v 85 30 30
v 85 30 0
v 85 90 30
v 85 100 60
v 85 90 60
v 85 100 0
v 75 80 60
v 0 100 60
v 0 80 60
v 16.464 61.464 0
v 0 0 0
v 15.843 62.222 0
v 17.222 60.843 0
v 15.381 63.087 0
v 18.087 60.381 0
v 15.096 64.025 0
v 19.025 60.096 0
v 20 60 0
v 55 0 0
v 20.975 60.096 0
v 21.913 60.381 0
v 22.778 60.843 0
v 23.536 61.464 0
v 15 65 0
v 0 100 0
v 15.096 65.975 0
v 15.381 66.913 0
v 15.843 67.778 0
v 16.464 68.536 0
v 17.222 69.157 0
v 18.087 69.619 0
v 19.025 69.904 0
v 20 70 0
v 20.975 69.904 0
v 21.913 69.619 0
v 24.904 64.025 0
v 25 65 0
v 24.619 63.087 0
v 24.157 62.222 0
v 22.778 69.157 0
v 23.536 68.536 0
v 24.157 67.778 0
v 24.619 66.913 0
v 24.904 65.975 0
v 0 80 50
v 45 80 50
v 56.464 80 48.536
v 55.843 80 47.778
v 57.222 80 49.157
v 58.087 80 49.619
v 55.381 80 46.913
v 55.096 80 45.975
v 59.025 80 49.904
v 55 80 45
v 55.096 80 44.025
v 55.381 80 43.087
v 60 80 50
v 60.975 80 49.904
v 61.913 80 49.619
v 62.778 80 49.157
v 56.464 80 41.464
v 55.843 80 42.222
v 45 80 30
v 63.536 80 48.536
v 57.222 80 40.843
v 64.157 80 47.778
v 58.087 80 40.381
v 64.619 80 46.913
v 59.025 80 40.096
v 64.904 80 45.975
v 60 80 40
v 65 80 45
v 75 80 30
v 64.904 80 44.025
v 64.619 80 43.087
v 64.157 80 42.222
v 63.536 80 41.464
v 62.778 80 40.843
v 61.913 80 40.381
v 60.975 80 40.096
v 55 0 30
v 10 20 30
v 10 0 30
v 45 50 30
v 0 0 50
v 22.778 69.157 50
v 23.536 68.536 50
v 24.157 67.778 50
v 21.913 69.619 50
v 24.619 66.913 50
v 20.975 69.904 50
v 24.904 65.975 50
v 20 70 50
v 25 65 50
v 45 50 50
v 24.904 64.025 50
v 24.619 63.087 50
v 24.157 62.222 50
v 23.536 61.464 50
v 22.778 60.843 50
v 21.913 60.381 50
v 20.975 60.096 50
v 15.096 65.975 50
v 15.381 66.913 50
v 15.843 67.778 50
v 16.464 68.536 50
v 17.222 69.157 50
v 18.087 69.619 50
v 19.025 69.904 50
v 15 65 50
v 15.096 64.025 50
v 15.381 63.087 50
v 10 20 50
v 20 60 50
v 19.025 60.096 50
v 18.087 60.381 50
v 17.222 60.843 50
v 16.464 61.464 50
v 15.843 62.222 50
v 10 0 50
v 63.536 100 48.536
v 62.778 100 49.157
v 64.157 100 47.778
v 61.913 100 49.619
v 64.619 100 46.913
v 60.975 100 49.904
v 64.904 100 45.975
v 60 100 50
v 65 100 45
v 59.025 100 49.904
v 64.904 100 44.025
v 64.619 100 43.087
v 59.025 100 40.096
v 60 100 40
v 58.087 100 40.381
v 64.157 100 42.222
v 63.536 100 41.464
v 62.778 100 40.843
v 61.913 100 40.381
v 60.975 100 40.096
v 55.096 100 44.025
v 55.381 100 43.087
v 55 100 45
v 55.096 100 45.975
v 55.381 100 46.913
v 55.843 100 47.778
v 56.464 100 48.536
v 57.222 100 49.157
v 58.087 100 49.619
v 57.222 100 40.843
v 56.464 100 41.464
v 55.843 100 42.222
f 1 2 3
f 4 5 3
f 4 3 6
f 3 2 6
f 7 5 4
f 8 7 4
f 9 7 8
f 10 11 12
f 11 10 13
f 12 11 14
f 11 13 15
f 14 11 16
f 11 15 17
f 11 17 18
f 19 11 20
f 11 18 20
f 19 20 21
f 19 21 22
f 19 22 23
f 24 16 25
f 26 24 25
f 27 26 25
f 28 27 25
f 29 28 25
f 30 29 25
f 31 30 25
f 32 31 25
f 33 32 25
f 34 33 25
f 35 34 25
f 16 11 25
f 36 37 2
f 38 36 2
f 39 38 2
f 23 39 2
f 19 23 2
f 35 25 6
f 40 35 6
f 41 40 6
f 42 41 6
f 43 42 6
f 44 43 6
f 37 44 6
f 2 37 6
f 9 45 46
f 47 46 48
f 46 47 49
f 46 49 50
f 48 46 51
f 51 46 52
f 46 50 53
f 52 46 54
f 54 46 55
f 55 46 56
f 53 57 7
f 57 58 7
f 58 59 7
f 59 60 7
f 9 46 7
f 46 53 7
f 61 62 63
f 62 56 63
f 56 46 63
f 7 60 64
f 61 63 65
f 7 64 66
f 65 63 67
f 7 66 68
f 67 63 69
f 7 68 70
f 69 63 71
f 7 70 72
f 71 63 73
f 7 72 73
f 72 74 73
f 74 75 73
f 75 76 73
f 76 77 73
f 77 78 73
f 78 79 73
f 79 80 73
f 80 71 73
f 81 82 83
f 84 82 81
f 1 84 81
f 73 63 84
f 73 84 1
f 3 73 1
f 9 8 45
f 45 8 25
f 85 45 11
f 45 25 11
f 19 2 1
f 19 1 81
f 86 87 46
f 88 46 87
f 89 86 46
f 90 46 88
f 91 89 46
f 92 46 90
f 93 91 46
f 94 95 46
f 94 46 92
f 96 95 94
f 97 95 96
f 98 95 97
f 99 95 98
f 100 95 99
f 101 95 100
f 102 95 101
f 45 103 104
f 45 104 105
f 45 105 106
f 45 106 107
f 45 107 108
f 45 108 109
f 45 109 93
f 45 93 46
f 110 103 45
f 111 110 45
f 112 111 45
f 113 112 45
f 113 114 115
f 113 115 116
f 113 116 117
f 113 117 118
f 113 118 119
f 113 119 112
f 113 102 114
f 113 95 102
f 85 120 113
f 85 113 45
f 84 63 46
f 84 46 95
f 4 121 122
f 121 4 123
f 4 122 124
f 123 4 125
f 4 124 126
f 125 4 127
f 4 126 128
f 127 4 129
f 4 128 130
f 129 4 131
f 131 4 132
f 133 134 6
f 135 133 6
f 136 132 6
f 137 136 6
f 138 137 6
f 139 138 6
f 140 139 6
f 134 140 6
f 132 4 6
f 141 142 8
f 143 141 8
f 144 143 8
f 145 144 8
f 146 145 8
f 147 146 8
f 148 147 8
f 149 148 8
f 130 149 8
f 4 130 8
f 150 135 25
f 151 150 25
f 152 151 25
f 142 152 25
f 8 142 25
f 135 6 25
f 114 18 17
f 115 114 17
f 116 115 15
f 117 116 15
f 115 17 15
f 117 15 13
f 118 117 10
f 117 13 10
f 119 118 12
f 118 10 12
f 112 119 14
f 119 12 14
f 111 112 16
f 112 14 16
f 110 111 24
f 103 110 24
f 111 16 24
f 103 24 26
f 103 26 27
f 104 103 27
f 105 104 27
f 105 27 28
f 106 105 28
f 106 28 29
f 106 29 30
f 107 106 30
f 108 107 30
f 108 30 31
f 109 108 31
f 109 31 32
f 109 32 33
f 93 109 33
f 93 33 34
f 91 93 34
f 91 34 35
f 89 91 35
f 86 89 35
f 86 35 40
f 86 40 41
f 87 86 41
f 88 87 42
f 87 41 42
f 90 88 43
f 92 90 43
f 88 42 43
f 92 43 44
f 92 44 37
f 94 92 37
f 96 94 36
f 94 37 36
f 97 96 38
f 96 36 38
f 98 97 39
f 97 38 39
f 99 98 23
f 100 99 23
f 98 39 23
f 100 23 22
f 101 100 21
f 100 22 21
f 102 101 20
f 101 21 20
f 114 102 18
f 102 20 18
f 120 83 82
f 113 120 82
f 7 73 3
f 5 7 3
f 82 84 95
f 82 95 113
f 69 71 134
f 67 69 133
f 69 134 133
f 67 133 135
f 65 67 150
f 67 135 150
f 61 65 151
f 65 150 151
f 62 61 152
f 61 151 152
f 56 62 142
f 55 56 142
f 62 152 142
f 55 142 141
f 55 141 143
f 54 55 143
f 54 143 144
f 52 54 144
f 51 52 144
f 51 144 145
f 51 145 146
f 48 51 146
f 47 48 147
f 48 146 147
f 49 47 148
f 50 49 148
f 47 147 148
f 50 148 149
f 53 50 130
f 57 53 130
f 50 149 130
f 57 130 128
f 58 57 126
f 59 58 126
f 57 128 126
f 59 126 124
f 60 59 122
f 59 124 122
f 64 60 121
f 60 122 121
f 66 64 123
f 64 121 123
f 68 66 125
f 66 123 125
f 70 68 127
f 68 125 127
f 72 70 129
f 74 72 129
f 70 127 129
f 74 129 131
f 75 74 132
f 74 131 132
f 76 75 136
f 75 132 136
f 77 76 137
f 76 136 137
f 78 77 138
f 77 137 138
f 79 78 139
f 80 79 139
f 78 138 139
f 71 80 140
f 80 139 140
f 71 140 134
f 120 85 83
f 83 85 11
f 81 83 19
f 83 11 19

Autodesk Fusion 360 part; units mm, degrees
sketch "Sketch1" plane through (0, 0, 0) normal (0, 0, 1) x (1, 0, 0)
  line L0 (0, 0) -> (55, 0)
  line L1 (0, 0) -> (0, 100)
  line L2 (0, 100) -> (85, 100)
  line L3 (85, 100) -> (85, 30)
  line L4 (85, 30) -> (55, 0)
  dimension "d1" = 55
  dimension "d2" = 100
  dimension "d3" = 85
  dimension "d4" = 70
extrude "Extrude1" add sketch "Sketch1" along normal blind 30
sketch "Sketch2" plane through (0, 0, 30) normal (0, 0, 1) x (-1, 0, 0)
  line L0 (0, 0) -> (-55, 0)
  line L1 (-55, 0) -> (-85, -30)
  line L2 (-85, -30) -> (-85, -100)
  line L3 (-85, -100) -> (0, -100)
  line L4 (0, -100) -> (0, 0)
  line L5 (0, 0) -> (-10, 0)
  line L6 (-10, 0) -> (-10, -20)
  line L7 (0, 0) -> (0, -100)
  line L8 (-85, -100) -> (-85, -90)
  line L9 (-85, -90) -> (-75, -80)
  line L10 (-75, -80) -> (-45, -80)
  line L11 (-45, -80) -> (-45, -50)
  line L12 (-45, -50) -> (-10, -20)
  dimension "d7" = 10
  dimension "d8" = 20
  dimension "d12" = 30
  dimension "d13" = 30
extrude "Extrude2" add sketch "Sketch2" along normal blind 20 contours L0 L2 L3 L4 L5 L6 L7 L8 L9 L10 L11 L12
sketch "Sketch3" plane through (0, 0, 50) normal (0, 0, 1) x (-1, 0, 0)
  line L0 (-85, -100) -> (0, -100)
  line L1 (0, -100) -> (0, 0)
  line L2 (0, 0) -> (-10, 0)
  line L3 (-10, 0) -> (-10, -20)
  line L4 (-10, -20) -> (-45, -50)
  line L5 (-45, -50) -> (-45, -80)
  line L6 (-45, -80) -> (-75, -80)
  line L7 (-75, -80) -> (-85, -90)
  line L8 (-85, -90) -> (-85, -100)
  line L9 (0, -100) -> (0, -80)
  line L10 (0, -80) -> (-75, -80)
  line L11 (-75, -80) -> (-85, -90)
  line L12 (-85, -90) -> (-85, -100)
  line L13 (-85, -100) -> (0, -100)
  dimension "d16" = 20
extrude "Extrude3" add sketch "Sketch3" along normal blind 10 contours L0 L1 L6 L7 L8 L9 L10 L11 L12 L13
sketch "Sketch4" plane through (0, 0, 50) normal (0, 0, 1) x (-1, 0, 0)
  line L0 (-45, -80) -> (0, -80)
  line L1 (0, -80) -> (0, 0)
  line L2 (0, 0) -> (-10, 0)
  line L3 (-10, 0) -> (-10, -20)
  line L4 (-10, -20) -> (-45, -50)
  line L5 (-45, -50) -> (-45, -80)
  line L6 (0, -80) -> (0, -65)
  line L7 (0, -65) -> (-20, -65)
  dimension "d20" = 20
hole "Hole1" at (20, 65, 50) direction (0, 0, -1) diameter 10 depth 50 tip angle 118
sketch "Sketch5" plane through (0, 80, 0) normal (0, -1, 0) x (1, 0, 0)
  line L0 (45, 30) -> (75, 30)
  line L1 (75, 30) -> (75, 60)
  line L2 (75, 60) -> (0, 60)
  line L3 (0, 60) -> (0, 50)
  line L4 (0, 50) -> (45, 50)
  line L5 (45, 50) -> (45, 30)
  line L6 (45, 50) -> (60, 50)
  line L7 (60, 50) -> (60, 45)
  dimension "d24" = 15
  dimension "d25" = 5
hole "Hole2" at (60, 80, 45) direction (0, 1, 0) diameter 10 depth 20 tip angle 118
